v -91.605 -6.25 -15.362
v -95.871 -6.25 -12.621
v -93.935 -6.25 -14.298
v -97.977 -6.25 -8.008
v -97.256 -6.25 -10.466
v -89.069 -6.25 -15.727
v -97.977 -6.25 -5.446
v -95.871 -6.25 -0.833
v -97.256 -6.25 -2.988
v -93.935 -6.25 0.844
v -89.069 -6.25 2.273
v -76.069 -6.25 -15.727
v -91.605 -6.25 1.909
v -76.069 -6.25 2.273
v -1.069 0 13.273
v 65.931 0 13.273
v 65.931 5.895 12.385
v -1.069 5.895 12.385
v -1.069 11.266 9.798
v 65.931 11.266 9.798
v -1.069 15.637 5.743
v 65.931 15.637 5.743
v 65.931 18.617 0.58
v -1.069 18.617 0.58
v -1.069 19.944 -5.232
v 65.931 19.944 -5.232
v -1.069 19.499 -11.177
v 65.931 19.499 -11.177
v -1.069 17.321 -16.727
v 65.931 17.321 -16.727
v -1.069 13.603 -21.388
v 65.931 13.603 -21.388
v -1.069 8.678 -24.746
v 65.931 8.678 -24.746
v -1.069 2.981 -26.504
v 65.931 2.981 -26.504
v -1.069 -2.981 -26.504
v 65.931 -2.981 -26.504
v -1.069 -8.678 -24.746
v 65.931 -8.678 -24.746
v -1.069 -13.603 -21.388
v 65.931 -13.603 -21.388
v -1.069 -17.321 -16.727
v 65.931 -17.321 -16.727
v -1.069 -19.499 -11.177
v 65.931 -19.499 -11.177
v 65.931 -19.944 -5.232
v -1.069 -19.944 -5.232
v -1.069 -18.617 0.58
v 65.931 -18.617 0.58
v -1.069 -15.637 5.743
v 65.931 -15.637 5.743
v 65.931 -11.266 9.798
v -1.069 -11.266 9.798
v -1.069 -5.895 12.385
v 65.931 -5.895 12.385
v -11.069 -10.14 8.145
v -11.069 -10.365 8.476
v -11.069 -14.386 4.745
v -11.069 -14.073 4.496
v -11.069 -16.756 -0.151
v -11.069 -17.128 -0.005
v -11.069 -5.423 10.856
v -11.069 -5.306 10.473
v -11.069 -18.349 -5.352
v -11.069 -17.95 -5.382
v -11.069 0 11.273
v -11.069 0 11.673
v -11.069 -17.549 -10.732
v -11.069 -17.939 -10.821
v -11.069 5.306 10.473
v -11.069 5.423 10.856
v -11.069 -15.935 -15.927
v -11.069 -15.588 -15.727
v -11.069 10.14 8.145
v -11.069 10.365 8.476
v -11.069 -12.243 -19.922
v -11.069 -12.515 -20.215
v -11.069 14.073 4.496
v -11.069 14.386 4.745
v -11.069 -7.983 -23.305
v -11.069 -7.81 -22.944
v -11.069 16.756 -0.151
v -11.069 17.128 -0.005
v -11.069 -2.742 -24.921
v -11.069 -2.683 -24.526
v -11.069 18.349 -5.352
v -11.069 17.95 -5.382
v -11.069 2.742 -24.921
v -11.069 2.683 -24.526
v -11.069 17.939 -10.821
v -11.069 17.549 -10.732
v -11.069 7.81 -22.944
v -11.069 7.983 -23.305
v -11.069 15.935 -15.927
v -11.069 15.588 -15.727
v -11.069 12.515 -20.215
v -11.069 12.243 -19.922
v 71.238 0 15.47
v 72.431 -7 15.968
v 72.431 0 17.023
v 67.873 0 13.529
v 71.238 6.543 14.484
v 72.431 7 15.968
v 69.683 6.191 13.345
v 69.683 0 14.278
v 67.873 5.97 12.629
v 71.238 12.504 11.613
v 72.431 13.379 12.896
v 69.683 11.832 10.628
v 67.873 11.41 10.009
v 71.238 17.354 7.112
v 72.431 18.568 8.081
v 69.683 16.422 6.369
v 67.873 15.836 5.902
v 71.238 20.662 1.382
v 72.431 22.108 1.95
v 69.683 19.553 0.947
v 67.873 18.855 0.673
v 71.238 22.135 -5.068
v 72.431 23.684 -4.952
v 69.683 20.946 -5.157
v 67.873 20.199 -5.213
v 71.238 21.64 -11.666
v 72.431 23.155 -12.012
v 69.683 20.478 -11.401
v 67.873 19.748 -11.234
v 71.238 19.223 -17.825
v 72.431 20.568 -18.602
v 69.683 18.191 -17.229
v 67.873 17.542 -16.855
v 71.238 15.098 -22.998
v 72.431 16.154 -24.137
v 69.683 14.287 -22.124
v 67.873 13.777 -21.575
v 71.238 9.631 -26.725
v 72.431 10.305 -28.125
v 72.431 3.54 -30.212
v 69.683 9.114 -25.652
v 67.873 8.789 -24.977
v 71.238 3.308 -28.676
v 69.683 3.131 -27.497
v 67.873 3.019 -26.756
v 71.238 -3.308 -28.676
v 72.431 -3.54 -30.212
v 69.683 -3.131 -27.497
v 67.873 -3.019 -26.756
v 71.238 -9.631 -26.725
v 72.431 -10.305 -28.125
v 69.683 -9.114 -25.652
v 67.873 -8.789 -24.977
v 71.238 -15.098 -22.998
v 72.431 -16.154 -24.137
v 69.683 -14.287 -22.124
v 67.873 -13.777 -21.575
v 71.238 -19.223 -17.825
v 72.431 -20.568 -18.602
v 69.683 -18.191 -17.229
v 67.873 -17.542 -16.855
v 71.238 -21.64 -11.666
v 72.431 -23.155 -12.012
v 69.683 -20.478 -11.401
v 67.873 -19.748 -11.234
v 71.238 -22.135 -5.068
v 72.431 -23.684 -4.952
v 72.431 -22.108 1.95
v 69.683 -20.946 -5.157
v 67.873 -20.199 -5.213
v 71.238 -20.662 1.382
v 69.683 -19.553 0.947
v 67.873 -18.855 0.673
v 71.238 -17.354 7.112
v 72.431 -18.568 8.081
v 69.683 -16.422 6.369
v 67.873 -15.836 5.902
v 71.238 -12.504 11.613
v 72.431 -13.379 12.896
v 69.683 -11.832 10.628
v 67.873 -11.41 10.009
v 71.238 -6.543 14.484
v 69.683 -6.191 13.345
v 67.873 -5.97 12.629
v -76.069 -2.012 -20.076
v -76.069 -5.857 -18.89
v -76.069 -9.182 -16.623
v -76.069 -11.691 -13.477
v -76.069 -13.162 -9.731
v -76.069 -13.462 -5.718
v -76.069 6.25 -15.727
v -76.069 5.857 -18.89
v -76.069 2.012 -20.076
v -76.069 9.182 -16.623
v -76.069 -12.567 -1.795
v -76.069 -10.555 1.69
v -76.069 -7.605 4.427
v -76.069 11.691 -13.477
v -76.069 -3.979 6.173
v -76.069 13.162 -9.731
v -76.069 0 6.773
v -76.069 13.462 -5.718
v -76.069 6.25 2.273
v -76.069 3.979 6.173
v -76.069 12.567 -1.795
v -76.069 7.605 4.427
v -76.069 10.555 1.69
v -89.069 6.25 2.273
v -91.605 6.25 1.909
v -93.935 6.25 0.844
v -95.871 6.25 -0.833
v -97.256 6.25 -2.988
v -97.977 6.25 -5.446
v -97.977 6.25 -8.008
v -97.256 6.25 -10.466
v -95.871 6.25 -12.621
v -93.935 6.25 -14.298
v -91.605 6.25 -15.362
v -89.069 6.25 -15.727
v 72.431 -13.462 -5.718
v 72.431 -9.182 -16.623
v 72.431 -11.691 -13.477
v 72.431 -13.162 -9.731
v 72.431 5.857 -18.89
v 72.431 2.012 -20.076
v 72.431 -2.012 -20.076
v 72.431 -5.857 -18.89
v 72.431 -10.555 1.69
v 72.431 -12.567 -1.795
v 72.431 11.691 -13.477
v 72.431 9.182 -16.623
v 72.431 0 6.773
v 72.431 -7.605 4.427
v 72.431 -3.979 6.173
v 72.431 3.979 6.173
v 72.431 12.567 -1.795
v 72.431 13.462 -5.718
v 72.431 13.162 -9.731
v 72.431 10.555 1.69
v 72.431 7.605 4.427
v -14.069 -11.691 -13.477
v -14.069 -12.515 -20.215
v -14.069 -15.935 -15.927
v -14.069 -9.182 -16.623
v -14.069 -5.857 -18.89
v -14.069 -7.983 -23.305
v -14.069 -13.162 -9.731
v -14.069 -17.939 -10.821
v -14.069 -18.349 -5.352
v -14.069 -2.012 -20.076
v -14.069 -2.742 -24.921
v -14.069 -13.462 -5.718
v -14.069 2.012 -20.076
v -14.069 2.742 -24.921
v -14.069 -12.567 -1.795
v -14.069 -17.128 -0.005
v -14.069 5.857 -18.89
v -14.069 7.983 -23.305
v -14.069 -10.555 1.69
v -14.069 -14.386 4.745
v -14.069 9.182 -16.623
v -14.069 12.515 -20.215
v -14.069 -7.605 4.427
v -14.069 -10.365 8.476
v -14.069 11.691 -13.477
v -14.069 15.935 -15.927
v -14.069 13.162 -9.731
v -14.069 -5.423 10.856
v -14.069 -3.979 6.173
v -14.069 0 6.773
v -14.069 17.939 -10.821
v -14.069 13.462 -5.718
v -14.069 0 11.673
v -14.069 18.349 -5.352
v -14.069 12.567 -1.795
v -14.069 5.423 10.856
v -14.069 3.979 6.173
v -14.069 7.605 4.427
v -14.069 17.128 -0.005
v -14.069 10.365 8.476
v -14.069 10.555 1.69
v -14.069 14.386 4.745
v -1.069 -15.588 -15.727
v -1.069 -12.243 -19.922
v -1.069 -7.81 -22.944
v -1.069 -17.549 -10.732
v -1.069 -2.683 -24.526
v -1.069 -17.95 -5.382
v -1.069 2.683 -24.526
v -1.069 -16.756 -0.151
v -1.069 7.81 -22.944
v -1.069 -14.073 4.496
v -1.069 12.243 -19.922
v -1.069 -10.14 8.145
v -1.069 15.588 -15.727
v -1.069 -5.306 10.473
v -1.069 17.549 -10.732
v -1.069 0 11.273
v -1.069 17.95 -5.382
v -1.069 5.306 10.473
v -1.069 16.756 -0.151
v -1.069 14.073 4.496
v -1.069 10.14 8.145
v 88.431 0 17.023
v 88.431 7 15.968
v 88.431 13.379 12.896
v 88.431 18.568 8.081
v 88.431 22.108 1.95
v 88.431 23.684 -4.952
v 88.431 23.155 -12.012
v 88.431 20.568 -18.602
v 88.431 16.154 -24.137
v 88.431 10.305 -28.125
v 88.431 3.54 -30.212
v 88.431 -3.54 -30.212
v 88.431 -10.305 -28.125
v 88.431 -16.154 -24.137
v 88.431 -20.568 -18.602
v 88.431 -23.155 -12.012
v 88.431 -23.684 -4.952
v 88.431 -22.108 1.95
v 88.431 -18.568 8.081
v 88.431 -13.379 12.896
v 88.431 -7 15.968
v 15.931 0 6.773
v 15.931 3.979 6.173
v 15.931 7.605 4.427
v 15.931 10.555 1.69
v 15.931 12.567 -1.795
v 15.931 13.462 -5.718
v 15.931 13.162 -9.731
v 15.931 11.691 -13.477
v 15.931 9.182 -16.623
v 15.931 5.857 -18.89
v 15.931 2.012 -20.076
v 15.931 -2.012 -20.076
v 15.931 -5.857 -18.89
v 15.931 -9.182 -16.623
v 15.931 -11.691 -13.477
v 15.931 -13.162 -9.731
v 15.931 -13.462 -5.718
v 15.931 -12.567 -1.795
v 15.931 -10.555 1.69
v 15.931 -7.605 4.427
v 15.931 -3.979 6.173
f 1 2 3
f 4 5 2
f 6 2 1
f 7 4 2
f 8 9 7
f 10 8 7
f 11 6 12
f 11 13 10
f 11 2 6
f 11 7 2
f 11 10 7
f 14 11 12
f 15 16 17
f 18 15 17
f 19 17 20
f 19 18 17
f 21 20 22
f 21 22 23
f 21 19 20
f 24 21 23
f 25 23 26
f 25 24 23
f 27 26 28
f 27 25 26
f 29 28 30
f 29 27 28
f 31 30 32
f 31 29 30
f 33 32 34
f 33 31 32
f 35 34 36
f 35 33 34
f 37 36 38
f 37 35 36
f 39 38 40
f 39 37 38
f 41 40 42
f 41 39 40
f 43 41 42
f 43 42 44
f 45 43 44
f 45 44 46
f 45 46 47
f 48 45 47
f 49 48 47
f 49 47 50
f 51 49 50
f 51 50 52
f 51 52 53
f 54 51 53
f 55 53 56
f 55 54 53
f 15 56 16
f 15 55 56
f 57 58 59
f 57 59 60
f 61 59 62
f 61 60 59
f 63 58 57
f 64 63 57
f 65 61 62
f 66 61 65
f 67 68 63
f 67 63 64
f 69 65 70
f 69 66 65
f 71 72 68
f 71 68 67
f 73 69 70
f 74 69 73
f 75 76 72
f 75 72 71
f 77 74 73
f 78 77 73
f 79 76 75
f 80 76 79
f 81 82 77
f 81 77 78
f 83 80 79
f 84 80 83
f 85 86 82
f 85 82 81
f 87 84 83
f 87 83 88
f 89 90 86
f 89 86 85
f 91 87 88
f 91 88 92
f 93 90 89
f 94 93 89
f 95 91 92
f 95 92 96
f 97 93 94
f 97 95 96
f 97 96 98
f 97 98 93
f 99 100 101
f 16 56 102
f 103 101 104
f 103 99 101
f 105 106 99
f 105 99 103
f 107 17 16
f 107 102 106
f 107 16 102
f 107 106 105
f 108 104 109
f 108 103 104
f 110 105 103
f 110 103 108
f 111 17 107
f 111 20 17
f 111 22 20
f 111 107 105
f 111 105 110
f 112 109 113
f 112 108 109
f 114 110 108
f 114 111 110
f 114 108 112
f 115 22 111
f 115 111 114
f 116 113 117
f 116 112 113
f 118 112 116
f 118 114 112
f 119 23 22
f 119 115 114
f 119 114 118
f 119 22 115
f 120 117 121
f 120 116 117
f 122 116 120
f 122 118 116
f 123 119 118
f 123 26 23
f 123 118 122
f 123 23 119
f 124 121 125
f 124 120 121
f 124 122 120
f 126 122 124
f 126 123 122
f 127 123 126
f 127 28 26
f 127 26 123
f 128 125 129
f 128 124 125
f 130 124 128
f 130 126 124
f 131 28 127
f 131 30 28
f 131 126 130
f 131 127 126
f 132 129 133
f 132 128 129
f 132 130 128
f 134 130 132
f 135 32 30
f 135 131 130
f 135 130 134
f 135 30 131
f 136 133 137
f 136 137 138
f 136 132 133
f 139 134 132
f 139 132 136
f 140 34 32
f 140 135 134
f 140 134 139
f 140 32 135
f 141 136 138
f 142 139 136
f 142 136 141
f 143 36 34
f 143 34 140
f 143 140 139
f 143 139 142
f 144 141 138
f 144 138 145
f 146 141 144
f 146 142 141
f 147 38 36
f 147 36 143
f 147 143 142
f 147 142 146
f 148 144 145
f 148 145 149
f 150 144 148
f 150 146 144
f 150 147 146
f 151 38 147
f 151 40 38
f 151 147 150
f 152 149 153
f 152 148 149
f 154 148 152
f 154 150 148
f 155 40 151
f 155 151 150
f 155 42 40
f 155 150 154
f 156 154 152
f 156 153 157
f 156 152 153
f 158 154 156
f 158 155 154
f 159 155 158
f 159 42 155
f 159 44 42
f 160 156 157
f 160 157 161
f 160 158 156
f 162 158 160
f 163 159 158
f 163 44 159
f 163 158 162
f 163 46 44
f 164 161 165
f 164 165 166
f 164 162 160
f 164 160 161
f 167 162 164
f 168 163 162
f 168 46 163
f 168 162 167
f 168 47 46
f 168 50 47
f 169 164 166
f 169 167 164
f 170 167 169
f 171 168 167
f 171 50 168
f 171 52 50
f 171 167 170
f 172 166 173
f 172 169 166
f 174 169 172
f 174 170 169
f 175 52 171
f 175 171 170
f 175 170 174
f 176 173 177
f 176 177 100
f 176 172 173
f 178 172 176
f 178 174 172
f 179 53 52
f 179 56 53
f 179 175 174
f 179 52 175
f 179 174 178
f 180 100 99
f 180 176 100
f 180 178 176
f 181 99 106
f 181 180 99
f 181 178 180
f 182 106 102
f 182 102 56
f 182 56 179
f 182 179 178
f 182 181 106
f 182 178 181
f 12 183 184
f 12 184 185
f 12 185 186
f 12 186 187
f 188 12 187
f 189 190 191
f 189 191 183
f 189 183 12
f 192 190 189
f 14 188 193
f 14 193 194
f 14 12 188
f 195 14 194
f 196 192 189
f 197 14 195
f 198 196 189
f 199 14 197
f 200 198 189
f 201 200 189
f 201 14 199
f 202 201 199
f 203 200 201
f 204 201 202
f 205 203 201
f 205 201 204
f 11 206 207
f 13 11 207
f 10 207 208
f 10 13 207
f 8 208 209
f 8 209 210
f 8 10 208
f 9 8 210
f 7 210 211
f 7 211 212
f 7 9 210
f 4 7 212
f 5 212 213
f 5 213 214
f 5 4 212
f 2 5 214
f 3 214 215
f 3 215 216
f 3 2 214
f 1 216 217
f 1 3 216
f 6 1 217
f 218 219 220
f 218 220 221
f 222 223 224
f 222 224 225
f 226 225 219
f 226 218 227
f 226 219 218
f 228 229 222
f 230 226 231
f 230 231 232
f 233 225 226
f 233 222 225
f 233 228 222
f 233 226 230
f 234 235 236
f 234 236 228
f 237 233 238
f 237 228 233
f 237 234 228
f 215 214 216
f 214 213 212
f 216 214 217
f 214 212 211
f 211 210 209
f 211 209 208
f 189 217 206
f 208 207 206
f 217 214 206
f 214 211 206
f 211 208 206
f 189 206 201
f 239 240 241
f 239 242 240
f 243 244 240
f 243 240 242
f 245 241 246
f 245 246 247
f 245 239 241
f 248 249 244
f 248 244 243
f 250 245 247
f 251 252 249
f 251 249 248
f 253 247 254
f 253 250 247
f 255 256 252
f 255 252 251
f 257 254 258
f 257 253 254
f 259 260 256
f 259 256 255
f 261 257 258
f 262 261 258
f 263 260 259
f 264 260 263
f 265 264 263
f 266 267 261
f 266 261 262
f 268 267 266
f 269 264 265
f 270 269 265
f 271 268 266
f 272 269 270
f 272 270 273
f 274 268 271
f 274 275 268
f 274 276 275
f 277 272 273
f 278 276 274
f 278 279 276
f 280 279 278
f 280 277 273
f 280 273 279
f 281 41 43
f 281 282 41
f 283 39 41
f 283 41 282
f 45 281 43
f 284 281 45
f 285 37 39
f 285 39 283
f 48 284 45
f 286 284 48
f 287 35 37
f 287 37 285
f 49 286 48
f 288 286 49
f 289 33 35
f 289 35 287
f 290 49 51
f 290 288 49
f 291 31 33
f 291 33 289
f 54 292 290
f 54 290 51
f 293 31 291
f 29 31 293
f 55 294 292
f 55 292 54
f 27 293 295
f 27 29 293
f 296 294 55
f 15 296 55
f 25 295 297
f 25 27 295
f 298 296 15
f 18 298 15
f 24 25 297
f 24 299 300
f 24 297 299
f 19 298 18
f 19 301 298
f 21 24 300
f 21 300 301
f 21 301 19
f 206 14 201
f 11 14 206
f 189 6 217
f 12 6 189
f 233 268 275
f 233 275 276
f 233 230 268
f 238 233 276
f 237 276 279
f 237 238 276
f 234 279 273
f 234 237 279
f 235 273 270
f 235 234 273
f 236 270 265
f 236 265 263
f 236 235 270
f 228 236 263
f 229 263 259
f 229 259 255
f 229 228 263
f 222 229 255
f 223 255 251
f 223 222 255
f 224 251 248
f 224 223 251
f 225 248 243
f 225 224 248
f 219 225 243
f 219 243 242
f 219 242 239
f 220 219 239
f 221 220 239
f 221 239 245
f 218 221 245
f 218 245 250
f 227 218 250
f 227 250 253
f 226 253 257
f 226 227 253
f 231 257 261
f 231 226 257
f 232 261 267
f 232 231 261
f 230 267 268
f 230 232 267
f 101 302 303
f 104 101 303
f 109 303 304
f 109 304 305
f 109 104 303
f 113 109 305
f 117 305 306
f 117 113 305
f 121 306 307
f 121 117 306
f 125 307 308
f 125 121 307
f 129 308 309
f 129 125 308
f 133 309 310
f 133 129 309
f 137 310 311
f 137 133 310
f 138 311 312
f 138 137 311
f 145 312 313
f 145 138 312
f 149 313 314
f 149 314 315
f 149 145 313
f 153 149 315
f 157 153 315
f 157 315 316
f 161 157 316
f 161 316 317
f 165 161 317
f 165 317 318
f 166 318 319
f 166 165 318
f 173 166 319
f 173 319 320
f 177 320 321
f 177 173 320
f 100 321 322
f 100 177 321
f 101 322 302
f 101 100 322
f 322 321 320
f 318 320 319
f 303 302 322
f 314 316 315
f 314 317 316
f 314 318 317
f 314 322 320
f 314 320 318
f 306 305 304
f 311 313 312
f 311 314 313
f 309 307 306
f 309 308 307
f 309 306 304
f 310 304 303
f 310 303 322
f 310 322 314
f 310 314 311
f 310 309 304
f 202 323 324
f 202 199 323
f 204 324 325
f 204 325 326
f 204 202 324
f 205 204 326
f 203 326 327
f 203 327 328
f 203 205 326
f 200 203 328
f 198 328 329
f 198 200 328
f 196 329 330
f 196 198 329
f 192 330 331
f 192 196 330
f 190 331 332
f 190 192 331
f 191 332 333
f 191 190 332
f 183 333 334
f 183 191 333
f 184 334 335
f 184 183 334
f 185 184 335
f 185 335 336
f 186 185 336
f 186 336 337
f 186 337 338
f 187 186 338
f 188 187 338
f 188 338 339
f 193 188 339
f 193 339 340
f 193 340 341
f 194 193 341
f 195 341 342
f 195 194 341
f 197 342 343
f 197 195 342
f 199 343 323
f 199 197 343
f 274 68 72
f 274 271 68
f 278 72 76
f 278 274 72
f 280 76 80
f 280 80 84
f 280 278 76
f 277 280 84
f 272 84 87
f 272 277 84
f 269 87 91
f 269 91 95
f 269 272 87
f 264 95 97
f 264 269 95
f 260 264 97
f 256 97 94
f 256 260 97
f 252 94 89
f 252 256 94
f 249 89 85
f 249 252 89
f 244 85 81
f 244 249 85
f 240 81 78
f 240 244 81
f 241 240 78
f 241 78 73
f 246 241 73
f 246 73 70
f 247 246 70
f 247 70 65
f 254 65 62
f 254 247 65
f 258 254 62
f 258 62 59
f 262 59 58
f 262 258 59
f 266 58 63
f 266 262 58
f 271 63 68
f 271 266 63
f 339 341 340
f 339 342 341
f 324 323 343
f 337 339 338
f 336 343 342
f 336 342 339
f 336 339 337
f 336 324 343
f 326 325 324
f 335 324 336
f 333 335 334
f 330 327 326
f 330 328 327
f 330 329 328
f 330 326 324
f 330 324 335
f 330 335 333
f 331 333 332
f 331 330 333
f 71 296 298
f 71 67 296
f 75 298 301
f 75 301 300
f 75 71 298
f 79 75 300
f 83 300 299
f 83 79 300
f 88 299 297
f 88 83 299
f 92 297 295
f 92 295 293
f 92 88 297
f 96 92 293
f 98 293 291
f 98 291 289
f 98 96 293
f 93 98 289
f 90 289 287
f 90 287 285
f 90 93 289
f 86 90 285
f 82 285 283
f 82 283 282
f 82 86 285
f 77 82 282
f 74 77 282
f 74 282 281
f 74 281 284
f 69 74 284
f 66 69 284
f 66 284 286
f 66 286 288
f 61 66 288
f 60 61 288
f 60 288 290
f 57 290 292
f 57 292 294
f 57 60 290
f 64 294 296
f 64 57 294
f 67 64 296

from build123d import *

# Parameters (mm, degrees)
F0_W     = 30
F0_H     = 13.5
F3_DEPTH = 6.25


with BuildPart() as f1:
    # F0 (on Front) → F1 (revolve)
    with BuildSketch(Plane.XZ):
        with BuildLine():
            Line((-14.068921, 11.673069), (-14.068921, 6.773069))
            Line((-14.068921, 6.773069), (15.931079, 6.773069))
            Line((15.931079, 6.773069), (72.431079, 6.773069))
            Line((72.431079, 6.773069), (72.431079, -6.726931))
            Line((72.431079, -6.726931), (88.431079, -6.726931))
            Line((88.431079, -6.726931), (88.431079, 11.273069))
            Line((88.431079, 11.273069), (88.431079, 17.023069))
            Line((88.431079, 17.023069), (72.431079, 17.023069))
            ThreePointArc((72.431079, 17.023069), (69.683162, 14.277792), (65.931079, 13.273069))
            Line((65.931079, 13.273069), (-1.068921, 13.273069))
            Line((-1.068921, 13.273069), (-1.068921, 11.273069))
            Line((-1.068921, 11.273069), (-11.068921, 11.273069))
            Line((-11.068921, 11.273069), (-11.068921, 11.673069))
            Line((-11.068921, 11.673069), (-14.068921, 11.673069))
        make_face()
    revolve(axis=Axis((-45.068921, 0, -6.726931), (-1, 0, 0)))


with BuildPart() as f2:
    # F0 (on Front) → F2 (revolve)
    with BuildSketch(Plane.XZ):
        Polygon((-76.068921, 2.273069), (-76.068921, -6.726931), (-14.068921, -6.726931), (-14.068921, 6.773069), (-76.068921, 6.773069), align=None)
        with Locations((0.931079, 0.023069)):
            Rectangle(F0_W, F0_H)
    revolve(axis=Axis((-45.068921, 0, -6.726931), (-1, 0, 0)))

    # F0 (on Front) → F3 (join, symmetric)
    with BuildSketch(Plane.XZ):
        with BuildLine():
            Line((-89.068921, -6.726931), (-80.068921, -6.726931))
            ThreePointArc((-80.068921, -6.726931), (-82.70496, -0.36297), (-89.068921, 2.273069))
            Line((-89.068921, 2.273069), (-89.068921, -6.726931))
        make_face()
        with BuildLine():
            ThreePointArc((-89.068921, 2.273069), (-82.70496, -0.36297), (-80.068921, -6.726931))
            Line((-80.068921, -6.726931), (-76.068921, -6.726931))
            Line((-76.068921, -6.726931), (-76.068921, 2.273069))
            Line((-76.068921, 2.273069), (-89.068921, 2.273069))
        make_face()
        with BuildLine():
            Line((-76.068921, -6.726931), (-80.068921, -6.726931))
            ThreePointArc((-80.068921, -6.726931), (-82.70496, -13.090892), (-89.068921, -15.726931))
            Line((-89.068921, -15.726931), (-76.068921, -15.726931))
            Line((-76.068921, -15.726931), (-76.068921, -6.726931))
        make_face()
        with BuildLine():
            ThreePointArc((-89.068921, -15.726931), (-82.70496, -13.090892), (-80.068921, -6.726931))
            Line((-80.068921, -6.726931), (-89.068921, -6.726931))
            Line((-89.068921, -6.726931), (-89.068921, -15.726931))
        make_face()
        with BuildLine():
            Line((-89.068921, -6.726931), (-89.068921, 2.273069))
            ThreePointArc((-89.068921, 2.273069), (-98.068921, -6.726931), (-89.068921, -15.726931))
            Line((-89.068921, -15.726931), (-89.068921, -6.726931))
        make_face()
    extrude(amount=F3_DEPTH, both=True)


solid = Compound([f1.part, f2.part])
